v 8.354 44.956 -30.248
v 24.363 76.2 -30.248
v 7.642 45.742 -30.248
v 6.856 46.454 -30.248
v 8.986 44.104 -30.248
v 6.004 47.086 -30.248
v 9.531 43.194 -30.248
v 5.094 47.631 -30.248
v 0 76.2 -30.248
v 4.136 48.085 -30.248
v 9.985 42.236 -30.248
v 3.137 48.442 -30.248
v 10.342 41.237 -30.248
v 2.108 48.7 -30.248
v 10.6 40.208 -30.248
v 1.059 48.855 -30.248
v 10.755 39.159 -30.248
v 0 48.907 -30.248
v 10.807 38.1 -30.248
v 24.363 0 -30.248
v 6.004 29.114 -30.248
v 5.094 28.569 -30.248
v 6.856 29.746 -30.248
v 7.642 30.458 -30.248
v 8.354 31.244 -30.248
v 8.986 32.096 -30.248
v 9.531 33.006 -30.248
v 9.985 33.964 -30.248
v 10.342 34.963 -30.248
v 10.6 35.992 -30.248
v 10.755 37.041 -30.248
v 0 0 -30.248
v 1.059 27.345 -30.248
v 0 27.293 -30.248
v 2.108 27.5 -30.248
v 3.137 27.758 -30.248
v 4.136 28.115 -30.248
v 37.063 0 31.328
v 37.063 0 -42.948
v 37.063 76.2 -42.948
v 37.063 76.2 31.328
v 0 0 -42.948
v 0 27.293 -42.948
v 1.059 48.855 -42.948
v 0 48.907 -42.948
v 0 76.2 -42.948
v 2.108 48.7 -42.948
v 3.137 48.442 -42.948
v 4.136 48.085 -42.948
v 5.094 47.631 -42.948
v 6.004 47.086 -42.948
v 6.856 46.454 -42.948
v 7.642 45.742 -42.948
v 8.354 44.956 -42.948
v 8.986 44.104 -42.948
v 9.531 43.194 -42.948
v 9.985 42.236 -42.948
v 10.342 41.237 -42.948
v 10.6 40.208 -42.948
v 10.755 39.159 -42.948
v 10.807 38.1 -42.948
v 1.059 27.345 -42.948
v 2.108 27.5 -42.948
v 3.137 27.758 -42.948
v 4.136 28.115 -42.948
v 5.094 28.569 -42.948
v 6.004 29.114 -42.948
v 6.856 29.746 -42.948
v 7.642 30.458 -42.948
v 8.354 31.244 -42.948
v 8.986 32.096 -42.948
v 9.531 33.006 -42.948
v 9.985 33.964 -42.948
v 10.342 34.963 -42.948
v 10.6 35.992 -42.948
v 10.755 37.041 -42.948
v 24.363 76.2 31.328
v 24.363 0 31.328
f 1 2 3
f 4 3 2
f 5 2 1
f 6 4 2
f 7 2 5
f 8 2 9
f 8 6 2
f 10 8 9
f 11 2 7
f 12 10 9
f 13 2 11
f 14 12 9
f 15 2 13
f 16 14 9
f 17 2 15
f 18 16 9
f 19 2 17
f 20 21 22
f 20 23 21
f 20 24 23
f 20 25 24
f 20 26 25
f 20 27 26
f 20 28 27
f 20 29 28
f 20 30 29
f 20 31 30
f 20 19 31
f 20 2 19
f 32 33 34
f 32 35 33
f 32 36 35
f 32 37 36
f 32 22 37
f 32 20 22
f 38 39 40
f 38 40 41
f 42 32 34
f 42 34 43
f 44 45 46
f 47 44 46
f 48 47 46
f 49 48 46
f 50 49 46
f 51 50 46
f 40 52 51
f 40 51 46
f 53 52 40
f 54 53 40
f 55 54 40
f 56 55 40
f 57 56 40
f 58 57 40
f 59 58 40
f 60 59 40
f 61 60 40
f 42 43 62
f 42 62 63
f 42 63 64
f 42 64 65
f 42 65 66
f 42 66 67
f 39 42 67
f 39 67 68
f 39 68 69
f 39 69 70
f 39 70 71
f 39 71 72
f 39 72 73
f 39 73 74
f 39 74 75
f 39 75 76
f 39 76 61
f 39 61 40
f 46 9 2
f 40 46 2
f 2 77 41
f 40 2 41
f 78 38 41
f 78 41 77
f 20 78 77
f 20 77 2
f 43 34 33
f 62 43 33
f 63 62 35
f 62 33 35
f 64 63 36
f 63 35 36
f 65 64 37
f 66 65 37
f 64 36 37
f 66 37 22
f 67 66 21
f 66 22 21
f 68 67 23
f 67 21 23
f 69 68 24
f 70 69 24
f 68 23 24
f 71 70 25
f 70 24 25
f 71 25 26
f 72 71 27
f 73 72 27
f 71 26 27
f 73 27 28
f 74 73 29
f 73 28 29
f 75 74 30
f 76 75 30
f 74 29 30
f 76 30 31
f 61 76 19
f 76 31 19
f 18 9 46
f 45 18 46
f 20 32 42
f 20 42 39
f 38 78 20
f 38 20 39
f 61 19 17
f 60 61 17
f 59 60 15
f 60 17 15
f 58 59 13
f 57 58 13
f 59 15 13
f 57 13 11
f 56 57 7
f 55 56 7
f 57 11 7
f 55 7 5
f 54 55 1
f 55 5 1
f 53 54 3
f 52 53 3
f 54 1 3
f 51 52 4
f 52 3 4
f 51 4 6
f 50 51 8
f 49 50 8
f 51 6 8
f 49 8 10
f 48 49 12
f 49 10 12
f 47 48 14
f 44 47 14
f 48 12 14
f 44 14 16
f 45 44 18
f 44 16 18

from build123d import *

# Parameters (mm, degrees)
F1_DEPTH = 76.2
F3_DEPTH = 39.624


with BuildPart() as f1:
    # F0 (on Front) → F1 (new body)
    with BuildSketch(Plane.XZ):
        Polygon((0, -30.248137), (0, -42.948137), (37.062691, -42.948137), (37.062691, 31.328041), (24.362691, 31.328041), (24.362691, -30.248137), align=None)
    extrude(amount=-F1_DEPTH)

    # F2 (on face) → F3 (cut)
    with BuildSketch(Plane.XY.offset(-30.248137)):
        with BuildLine():
            ThreePointArc((0, 27.292805), (7.641841, 30.458159), (10.807195, 38.1))
            ThreePointArc((10.807195, 38.1), (7.641841, 45.741841), (0, 48.907195))
            Line((0, 48.907195), (0, 27.292805))
        make_face()
    extrude(amount=-F3_DEPTH, mode=Mode.SUBTRACT)


solid = f1.part
